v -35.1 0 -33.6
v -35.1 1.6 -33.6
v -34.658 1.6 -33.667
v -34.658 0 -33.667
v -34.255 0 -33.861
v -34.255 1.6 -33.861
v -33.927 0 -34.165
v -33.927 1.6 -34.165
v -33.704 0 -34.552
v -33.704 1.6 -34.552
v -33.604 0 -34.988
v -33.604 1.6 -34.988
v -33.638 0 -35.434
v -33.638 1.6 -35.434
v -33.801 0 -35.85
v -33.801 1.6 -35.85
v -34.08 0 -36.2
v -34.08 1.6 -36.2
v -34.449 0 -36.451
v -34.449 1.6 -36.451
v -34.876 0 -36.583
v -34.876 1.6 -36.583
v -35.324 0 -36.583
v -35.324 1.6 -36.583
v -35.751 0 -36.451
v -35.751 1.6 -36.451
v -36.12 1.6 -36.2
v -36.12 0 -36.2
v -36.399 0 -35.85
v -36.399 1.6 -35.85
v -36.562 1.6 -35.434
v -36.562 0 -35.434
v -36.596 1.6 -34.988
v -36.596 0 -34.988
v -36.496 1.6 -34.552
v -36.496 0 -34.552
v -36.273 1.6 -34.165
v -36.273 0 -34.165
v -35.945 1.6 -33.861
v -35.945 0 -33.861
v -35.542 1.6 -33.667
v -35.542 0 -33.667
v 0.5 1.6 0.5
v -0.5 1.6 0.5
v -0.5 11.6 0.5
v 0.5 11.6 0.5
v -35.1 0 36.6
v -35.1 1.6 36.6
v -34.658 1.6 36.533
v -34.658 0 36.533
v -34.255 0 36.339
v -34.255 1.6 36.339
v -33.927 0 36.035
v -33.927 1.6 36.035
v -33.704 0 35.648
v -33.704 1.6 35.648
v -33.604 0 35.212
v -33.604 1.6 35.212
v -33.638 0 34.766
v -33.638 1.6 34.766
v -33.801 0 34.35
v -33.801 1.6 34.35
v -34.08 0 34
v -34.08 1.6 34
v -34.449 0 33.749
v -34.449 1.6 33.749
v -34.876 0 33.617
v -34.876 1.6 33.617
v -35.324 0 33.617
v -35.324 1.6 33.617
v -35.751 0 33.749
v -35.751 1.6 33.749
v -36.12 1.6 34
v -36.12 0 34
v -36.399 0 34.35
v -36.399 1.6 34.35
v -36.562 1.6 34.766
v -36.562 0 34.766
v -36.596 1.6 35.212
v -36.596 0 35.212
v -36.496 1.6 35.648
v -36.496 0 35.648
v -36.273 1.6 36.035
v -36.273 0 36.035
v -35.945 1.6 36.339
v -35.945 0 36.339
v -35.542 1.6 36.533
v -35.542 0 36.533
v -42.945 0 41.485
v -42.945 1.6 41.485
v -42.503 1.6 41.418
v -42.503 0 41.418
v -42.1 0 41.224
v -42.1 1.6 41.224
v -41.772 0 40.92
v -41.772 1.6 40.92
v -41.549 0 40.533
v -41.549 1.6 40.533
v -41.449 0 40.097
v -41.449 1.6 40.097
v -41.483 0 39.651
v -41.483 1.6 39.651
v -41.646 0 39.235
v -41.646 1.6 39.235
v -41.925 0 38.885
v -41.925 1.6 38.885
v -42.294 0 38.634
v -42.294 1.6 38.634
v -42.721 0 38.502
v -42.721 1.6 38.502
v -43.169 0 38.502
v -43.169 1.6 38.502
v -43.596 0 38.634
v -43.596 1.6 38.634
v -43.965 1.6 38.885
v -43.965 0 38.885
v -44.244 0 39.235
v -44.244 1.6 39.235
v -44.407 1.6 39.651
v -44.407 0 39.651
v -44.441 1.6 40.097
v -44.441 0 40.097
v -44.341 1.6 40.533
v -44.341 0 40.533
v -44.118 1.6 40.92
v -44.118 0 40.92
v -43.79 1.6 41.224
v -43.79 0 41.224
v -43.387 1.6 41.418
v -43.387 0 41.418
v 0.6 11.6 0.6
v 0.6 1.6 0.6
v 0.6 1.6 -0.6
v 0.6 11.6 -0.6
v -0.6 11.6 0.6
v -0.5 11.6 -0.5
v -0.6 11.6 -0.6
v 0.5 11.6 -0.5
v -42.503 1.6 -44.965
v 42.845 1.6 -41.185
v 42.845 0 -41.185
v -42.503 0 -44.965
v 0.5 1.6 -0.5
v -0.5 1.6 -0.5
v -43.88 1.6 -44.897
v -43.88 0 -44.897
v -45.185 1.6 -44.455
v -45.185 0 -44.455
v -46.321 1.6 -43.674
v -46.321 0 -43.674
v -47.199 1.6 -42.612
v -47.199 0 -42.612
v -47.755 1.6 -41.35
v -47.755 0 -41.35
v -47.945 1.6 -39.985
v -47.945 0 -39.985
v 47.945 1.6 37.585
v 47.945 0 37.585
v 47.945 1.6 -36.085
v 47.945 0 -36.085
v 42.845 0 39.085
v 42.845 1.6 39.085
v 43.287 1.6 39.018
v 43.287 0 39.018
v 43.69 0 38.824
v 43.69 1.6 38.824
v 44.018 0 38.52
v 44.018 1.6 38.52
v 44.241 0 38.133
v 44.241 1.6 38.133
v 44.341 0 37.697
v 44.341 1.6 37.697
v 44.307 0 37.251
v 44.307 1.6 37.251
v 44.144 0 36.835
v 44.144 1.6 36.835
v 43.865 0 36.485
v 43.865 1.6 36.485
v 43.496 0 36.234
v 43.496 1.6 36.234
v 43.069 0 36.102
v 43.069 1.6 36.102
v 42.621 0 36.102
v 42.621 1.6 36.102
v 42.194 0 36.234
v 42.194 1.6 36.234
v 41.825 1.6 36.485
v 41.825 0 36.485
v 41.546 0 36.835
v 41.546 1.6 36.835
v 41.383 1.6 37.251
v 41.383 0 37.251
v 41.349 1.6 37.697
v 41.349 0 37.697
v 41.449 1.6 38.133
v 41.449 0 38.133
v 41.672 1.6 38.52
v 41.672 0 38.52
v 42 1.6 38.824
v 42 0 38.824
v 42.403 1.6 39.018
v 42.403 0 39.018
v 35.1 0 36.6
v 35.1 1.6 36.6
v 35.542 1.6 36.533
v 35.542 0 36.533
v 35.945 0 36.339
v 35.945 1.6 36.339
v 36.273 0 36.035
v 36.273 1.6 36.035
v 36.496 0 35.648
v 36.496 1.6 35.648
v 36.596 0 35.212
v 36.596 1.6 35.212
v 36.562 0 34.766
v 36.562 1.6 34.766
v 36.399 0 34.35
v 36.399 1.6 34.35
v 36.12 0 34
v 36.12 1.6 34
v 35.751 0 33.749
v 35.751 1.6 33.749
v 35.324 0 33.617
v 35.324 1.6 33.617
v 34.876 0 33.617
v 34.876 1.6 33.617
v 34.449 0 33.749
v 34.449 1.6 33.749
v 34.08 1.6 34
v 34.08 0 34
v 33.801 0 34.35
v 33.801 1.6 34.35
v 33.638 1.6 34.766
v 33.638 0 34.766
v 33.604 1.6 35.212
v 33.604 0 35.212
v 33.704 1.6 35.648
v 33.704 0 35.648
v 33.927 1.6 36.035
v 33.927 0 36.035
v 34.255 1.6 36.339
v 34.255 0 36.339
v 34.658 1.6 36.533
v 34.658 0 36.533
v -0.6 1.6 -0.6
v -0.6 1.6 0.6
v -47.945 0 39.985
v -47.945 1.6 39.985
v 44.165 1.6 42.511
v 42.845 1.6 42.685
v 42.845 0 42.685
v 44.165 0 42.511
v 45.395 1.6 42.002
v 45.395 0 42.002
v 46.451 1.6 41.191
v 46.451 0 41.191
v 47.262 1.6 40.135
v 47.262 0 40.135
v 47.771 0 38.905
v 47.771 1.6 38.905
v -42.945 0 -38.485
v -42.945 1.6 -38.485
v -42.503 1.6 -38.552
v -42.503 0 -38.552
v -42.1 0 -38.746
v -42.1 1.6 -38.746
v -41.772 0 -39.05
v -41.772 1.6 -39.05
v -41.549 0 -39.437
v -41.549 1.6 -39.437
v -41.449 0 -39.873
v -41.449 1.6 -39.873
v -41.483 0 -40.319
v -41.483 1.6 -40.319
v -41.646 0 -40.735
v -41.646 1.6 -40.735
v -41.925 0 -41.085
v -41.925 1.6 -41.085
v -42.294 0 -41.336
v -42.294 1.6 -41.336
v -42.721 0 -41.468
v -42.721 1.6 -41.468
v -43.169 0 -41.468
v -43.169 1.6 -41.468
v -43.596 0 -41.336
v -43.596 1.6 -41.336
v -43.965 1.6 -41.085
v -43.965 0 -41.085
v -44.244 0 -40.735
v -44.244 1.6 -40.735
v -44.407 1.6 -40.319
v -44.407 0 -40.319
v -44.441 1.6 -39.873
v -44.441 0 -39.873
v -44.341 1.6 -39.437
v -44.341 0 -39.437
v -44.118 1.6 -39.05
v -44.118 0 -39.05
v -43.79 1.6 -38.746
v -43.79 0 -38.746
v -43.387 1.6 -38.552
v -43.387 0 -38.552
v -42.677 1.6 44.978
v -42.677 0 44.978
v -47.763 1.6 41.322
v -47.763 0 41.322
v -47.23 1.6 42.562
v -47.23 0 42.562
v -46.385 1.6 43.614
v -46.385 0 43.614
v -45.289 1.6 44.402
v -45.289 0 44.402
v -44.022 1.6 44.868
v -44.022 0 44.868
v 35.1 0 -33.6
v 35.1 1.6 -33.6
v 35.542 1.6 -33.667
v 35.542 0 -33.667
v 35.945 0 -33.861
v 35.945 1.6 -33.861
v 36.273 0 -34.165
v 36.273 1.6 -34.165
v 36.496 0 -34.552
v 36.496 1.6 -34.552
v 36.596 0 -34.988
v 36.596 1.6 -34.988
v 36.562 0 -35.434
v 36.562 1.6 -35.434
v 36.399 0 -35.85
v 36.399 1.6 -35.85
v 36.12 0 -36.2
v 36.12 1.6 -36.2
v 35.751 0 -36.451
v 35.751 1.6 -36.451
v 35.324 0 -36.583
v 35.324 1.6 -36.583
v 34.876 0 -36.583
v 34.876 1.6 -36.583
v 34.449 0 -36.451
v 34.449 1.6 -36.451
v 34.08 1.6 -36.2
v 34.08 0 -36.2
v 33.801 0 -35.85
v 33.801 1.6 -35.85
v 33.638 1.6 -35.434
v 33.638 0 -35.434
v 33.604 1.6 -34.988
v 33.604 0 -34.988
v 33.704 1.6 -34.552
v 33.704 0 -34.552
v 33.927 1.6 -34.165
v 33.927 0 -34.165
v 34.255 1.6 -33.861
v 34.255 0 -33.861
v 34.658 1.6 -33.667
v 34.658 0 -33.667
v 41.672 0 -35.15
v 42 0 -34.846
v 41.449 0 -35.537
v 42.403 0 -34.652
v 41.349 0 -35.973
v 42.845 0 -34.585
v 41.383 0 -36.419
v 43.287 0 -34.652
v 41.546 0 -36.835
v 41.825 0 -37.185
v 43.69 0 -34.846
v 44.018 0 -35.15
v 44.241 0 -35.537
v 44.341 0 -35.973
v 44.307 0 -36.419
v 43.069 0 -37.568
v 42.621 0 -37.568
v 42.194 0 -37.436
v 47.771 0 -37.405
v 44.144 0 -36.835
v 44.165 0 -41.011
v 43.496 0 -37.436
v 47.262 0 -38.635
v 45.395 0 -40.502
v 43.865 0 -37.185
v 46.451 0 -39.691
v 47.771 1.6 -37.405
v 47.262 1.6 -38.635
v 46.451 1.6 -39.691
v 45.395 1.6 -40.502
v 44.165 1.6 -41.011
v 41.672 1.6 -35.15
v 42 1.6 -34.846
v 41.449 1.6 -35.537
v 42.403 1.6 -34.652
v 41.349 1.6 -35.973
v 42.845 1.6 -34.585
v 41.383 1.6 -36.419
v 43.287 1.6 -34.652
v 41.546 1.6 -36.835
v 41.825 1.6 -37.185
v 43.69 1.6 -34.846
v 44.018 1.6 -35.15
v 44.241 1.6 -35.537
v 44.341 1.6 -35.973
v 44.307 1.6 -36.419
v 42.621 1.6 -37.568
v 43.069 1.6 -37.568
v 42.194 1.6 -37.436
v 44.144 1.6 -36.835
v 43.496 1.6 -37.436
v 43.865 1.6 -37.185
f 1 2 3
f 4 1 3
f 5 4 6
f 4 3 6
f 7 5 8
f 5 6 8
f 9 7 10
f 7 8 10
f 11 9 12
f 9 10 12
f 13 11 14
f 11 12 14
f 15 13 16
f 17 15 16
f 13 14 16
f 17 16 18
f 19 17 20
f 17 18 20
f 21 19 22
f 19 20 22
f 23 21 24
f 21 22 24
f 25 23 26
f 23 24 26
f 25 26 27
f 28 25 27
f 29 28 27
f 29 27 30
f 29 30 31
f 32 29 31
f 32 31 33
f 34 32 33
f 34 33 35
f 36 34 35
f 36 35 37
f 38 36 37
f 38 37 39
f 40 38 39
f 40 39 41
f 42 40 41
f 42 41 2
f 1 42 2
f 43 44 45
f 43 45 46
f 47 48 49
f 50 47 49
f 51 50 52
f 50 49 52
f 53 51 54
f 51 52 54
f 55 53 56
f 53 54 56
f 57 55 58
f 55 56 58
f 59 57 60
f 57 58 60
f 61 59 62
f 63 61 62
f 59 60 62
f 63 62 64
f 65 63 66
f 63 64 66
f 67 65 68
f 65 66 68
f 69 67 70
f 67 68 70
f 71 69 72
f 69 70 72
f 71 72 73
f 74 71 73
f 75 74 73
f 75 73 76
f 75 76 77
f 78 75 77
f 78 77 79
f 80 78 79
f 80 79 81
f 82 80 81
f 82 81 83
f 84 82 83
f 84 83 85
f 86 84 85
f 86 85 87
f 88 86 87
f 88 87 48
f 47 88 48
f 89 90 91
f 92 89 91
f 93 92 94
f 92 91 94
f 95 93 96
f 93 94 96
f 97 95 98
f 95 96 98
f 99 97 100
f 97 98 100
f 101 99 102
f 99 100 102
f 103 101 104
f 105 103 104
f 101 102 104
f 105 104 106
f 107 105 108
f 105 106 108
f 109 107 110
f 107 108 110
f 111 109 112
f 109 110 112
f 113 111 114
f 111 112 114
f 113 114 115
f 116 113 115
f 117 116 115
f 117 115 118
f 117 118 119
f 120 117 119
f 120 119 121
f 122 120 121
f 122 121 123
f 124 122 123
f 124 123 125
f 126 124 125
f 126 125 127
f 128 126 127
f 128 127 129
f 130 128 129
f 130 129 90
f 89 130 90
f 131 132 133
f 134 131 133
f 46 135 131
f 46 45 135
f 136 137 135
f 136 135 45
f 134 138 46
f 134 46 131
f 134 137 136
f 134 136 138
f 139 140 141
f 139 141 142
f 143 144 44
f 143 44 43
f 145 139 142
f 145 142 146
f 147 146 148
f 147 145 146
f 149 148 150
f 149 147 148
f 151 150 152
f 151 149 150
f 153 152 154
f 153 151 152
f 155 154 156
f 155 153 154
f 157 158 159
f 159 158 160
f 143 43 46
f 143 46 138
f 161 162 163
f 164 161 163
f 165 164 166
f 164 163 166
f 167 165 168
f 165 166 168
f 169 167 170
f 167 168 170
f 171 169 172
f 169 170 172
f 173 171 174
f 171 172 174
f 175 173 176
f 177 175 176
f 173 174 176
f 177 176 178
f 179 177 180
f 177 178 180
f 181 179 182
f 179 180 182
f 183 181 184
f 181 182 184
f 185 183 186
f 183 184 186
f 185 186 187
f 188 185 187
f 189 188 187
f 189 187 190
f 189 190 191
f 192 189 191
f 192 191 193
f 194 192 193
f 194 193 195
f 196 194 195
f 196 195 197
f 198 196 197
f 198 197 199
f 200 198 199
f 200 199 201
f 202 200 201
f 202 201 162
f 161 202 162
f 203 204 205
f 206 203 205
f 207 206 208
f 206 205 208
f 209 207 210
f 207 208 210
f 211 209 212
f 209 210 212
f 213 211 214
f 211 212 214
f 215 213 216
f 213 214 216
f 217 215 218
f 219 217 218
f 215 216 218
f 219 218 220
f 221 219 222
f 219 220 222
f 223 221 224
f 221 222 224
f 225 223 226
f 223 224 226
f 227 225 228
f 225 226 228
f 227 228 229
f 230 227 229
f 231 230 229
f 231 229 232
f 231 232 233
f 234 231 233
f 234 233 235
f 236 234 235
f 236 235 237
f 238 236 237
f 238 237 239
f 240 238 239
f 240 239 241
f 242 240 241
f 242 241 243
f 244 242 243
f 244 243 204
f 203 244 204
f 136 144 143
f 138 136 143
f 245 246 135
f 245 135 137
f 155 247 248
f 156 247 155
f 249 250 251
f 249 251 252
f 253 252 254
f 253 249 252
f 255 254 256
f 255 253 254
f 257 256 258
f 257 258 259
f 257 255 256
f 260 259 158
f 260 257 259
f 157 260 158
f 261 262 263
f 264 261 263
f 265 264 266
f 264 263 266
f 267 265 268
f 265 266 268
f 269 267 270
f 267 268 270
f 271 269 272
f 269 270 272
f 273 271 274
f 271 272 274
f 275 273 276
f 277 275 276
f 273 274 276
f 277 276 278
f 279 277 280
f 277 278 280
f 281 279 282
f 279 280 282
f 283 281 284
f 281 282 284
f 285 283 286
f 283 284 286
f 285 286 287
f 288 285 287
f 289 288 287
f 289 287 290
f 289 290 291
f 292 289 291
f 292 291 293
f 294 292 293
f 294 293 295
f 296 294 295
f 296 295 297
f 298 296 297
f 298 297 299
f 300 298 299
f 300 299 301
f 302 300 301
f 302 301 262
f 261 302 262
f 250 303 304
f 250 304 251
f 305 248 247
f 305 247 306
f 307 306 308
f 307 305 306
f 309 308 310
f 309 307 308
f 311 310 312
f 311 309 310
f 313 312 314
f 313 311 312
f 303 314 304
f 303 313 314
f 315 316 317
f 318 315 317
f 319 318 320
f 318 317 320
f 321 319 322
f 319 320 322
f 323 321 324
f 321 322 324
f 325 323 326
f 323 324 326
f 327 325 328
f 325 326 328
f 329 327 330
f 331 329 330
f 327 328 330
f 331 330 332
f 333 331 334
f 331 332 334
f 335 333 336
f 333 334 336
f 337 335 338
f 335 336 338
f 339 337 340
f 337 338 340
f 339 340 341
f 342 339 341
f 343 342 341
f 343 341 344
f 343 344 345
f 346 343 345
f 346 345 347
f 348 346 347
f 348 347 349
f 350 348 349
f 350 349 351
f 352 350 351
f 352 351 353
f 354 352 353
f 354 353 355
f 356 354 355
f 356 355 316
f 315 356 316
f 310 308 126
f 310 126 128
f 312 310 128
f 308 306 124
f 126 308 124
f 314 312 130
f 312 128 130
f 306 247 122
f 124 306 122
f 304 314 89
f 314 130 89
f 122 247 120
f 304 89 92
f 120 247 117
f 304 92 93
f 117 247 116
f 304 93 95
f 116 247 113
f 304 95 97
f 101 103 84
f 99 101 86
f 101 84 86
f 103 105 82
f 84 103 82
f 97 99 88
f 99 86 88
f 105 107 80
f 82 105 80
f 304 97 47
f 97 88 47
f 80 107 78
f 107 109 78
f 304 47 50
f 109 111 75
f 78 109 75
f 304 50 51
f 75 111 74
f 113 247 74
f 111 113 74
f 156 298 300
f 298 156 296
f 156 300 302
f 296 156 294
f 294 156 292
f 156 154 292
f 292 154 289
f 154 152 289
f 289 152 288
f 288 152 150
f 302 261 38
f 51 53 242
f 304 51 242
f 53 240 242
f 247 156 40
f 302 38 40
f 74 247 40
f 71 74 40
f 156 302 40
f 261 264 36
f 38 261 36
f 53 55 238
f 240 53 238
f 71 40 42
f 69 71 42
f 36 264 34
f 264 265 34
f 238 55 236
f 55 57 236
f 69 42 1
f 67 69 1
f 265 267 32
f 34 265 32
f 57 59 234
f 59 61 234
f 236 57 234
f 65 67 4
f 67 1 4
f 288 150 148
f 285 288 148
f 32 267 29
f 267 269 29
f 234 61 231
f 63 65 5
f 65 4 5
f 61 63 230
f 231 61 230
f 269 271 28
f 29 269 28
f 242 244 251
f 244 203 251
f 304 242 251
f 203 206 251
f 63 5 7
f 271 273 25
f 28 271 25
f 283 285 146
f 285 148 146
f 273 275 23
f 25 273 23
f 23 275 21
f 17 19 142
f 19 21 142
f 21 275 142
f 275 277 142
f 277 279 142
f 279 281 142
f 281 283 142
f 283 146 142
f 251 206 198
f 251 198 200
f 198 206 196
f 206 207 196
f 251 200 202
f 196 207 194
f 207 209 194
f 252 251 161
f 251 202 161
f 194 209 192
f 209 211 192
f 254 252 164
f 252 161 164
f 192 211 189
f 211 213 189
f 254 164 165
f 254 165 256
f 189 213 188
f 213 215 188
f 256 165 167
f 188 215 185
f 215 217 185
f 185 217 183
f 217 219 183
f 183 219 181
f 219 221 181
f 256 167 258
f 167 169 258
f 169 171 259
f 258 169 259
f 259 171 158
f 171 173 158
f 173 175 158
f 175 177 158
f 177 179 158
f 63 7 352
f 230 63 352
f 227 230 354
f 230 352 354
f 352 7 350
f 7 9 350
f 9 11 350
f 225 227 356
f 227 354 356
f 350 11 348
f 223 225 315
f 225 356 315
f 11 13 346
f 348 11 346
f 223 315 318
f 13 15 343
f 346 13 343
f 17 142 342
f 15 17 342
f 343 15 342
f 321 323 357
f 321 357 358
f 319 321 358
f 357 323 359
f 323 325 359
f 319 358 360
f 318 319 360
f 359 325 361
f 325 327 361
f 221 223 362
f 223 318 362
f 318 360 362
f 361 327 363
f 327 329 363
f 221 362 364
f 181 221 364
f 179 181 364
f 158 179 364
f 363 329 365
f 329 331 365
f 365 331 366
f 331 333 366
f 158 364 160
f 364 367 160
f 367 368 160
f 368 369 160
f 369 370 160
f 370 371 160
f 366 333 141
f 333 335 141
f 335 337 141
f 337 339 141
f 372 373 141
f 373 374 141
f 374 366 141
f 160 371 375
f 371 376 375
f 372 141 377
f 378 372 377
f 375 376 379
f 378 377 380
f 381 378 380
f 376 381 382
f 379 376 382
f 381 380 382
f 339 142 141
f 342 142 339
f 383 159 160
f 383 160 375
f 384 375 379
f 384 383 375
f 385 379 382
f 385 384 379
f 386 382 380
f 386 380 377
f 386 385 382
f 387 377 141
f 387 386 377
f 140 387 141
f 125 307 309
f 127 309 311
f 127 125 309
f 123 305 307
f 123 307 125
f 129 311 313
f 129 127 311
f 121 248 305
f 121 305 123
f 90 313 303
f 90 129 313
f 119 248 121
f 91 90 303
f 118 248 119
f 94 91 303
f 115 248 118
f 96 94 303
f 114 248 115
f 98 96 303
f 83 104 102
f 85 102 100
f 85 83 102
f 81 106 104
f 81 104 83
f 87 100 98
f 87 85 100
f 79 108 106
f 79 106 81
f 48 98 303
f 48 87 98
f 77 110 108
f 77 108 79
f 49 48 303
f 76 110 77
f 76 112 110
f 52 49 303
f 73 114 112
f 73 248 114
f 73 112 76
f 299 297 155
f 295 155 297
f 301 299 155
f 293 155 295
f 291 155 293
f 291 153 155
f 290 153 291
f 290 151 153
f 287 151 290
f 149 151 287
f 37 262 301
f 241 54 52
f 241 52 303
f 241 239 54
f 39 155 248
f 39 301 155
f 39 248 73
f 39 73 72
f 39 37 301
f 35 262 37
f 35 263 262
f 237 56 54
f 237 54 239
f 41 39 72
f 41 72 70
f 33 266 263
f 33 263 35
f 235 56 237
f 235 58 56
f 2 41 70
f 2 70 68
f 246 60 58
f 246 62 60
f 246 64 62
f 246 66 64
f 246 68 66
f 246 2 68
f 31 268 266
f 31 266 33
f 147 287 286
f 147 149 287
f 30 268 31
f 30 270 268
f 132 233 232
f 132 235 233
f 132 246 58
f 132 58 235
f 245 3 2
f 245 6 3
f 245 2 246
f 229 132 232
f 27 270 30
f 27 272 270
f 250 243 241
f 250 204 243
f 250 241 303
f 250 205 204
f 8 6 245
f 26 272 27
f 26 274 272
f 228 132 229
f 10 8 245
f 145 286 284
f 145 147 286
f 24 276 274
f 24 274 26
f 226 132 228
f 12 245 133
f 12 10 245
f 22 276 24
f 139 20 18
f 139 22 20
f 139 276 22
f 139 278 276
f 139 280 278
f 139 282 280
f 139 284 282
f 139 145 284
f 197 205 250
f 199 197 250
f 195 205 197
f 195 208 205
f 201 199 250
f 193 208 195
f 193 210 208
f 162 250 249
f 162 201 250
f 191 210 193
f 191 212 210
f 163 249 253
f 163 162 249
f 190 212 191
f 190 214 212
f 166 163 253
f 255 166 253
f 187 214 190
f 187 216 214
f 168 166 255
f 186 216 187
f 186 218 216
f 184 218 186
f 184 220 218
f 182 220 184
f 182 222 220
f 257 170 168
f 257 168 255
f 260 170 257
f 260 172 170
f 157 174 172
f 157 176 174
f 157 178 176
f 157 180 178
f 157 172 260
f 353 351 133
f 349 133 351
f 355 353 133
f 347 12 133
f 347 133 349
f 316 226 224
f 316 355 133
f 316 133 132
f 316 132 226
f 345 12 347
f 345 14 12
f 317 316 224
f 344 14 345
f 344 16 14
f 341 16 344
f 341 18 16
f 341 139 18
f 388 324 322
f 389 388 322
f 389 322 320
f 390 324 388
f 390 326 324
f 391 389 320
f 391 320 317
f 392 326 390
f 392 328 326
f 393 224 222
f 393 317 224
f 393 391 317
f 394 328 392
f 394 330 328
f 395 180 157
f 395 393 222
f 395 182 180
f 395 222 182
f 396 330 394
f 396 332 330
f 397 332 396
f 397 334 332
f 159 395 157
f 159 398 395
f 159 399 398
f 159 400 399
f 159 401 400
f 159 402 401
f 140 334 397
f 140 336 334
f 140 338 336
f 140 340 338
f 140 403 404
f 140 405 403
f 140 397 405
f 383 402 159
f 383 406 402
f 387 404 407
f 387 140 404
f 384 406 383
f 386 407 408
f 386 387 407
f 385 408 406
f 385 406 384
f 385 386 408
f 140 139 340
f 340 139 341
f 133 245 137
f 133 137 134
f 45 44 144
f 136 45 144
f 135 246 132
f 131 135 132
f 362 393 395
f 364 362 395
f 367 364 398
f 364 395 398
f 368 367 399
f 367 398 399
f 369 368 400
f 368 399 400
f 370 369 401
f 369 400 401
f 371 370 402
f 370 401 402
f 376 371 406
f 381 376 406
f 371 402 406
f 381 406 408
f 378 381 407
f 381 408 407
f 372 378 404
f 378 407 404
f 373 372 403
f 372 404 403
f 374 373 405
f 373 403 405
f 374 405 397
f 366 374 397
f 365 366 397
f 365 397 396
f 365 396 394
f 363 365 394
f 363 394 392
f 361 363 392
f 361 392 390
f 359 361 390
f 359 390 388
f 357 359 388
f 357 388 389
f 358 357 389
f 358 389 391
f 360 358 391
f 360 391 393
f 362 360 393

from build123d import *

# Parameters (mm, degrees)
SKETCH1_W           = 95.89
SKETCH1_H           = 90.17
SUBSTRATE_DEPTH     = 1.6
SKETCH2_R           = 1.5
CUT_EXTRUDE2_DEPTH  = 10
SKETCH3_W           = 1.2
SKETCH3_H           = 1.2
SKETCH3_W_2         = 1
SKETCH3_H_2         = 1
BOSS_EXTRUDE1_DEPTH = 10
SKETCH4_OUTSIDE_W   = 124.318
SKETCH4_OUTSIDE_H   = 118.598
CUT_EXTRUDE3_DEPTH  = 10
SKETCH5_R           = 1.5
CUT_EXTRUDE4_DEPTH  = 10


with BuildPart() as part:
    # Sketch1 → Substrate (new body)
    with BuildSketch(Plane(origin=(0, 0, 0), x_dir=(1, 0, 0), z_dir=(0, 1, 0))):
        Rectangle(SKETCH1_W, SKETCH1_H)
    extrude(amount=SUBSTRATE_DEPTH)

    # Sketch2 → Cut-Extrude2 (cut)
    with BuildSketch(Plane(origin=(0, 1.6, 0), x_dir=(1, 0, 0), z_dir=(0, 1, 0))):
        with Locations(Location((42.845, 36.085, 0), (0, 0, 270))):
            Circle(SKETCH2_R)
        with Locations(Location((42.845, -37.585, 0), (0, 0, 270))):
            Circle(SKETCH2_R)
        with Locations(Location((-42.945, -39.985, 0), (0, 0, 270))):
            Circle(SKETCH2_R)
        with Locations(Location((-42.945, 39.985, 0), (0, 0, 270))):
            Circle(SKETCH2_R)
    extrude(amount=-CUT_EXTRUDE2_DEPTH, mode=Mode.SUBTRACT)

    # Sketch3 → Boss-Extrude1 (add)
    with BuildSketch(Plane(origin=(0, 1.6, 0), x_dir=(1, 0, 0), z_dir=(0, 1, 0))):
        Rectangle(SKETCH3_W, SKETCH3_H)
        Rectangle(SKETCH3_W_2, SKETCH3_H_2, mode=Mode.SUBTRACT)
    extrude(amount=BOSS_EXTRUDE1_DEPTH)

    # Sketch4 outside → Cut-Extrude3 (cut)
    with BuildSketch(Plane(origin=(0, 1.6, 0), x_dir=(1, 0, 0), z_dir=(0, 1, 0))):
        Rectangle(SKETCH4_OUTSIDE_W, SKETCH4_OUTSIDE_H)
        with BuildLine():
            Line((-42.677096043, -44.977817588), (42.845, -42.685))
            ThreePointArc((42.845, -42.685), (46.451244584, -41.191244584), (47.945, -37.585))
            Line((47.945, -37.585), (47.945, 36.085))
            ThreePointArc((47.945, 36.085), (46.451244584, 39.691244584), (42.845, 41.185))
            Line((42.845, 41.185), (-42.502925272, 44.965418651))
            ThreePointArc((-42.502925272, 44.965418651), (-46.320620414, 43.673520953), (-47.945, 39.985))
            Line((-47.945, 39.985), (-47.945, -39.985))
            ThreePointArc((-47.945, -39.985), (-46.384511609, -43.614016381), (-42.677096043, -44.977817588))
        make_face(mode=Mode.SUBTRACT)
    extrude(amount=-CUT_EXTRUDE3_DEPTH, mode=Mode.SUBTRACT)

    # Sketch5 → Cut-Extrude4 (cut)
    with BuildSketch(Plane(origin=(0, 1.6, 0), x_dir=(1, 0, 0), z_dir=(0, 1, 0))):
        with Locations(Location((-35.1, 35.1, 0), (0, 0, 270))):
            Circle(SKETCH5_R)
        with Locations(Location((35.1, 35.1, 0), (0, 0, 270))):
            Circle(SKETCH5_R)
        with Locations(Location((35.1, -35.1, 0), (0, 0, 270))):
            Circle(SKETCH5_R)
        with Locations(Location((-35.1, -35.1, 0), (0, 0, 270))):
            Circle(SKETCH5_R)
    extrude(amount=-CUT_EXTRUDE4_DEPTH, mode=Mode.SUBTRACT)


solid = part.part
